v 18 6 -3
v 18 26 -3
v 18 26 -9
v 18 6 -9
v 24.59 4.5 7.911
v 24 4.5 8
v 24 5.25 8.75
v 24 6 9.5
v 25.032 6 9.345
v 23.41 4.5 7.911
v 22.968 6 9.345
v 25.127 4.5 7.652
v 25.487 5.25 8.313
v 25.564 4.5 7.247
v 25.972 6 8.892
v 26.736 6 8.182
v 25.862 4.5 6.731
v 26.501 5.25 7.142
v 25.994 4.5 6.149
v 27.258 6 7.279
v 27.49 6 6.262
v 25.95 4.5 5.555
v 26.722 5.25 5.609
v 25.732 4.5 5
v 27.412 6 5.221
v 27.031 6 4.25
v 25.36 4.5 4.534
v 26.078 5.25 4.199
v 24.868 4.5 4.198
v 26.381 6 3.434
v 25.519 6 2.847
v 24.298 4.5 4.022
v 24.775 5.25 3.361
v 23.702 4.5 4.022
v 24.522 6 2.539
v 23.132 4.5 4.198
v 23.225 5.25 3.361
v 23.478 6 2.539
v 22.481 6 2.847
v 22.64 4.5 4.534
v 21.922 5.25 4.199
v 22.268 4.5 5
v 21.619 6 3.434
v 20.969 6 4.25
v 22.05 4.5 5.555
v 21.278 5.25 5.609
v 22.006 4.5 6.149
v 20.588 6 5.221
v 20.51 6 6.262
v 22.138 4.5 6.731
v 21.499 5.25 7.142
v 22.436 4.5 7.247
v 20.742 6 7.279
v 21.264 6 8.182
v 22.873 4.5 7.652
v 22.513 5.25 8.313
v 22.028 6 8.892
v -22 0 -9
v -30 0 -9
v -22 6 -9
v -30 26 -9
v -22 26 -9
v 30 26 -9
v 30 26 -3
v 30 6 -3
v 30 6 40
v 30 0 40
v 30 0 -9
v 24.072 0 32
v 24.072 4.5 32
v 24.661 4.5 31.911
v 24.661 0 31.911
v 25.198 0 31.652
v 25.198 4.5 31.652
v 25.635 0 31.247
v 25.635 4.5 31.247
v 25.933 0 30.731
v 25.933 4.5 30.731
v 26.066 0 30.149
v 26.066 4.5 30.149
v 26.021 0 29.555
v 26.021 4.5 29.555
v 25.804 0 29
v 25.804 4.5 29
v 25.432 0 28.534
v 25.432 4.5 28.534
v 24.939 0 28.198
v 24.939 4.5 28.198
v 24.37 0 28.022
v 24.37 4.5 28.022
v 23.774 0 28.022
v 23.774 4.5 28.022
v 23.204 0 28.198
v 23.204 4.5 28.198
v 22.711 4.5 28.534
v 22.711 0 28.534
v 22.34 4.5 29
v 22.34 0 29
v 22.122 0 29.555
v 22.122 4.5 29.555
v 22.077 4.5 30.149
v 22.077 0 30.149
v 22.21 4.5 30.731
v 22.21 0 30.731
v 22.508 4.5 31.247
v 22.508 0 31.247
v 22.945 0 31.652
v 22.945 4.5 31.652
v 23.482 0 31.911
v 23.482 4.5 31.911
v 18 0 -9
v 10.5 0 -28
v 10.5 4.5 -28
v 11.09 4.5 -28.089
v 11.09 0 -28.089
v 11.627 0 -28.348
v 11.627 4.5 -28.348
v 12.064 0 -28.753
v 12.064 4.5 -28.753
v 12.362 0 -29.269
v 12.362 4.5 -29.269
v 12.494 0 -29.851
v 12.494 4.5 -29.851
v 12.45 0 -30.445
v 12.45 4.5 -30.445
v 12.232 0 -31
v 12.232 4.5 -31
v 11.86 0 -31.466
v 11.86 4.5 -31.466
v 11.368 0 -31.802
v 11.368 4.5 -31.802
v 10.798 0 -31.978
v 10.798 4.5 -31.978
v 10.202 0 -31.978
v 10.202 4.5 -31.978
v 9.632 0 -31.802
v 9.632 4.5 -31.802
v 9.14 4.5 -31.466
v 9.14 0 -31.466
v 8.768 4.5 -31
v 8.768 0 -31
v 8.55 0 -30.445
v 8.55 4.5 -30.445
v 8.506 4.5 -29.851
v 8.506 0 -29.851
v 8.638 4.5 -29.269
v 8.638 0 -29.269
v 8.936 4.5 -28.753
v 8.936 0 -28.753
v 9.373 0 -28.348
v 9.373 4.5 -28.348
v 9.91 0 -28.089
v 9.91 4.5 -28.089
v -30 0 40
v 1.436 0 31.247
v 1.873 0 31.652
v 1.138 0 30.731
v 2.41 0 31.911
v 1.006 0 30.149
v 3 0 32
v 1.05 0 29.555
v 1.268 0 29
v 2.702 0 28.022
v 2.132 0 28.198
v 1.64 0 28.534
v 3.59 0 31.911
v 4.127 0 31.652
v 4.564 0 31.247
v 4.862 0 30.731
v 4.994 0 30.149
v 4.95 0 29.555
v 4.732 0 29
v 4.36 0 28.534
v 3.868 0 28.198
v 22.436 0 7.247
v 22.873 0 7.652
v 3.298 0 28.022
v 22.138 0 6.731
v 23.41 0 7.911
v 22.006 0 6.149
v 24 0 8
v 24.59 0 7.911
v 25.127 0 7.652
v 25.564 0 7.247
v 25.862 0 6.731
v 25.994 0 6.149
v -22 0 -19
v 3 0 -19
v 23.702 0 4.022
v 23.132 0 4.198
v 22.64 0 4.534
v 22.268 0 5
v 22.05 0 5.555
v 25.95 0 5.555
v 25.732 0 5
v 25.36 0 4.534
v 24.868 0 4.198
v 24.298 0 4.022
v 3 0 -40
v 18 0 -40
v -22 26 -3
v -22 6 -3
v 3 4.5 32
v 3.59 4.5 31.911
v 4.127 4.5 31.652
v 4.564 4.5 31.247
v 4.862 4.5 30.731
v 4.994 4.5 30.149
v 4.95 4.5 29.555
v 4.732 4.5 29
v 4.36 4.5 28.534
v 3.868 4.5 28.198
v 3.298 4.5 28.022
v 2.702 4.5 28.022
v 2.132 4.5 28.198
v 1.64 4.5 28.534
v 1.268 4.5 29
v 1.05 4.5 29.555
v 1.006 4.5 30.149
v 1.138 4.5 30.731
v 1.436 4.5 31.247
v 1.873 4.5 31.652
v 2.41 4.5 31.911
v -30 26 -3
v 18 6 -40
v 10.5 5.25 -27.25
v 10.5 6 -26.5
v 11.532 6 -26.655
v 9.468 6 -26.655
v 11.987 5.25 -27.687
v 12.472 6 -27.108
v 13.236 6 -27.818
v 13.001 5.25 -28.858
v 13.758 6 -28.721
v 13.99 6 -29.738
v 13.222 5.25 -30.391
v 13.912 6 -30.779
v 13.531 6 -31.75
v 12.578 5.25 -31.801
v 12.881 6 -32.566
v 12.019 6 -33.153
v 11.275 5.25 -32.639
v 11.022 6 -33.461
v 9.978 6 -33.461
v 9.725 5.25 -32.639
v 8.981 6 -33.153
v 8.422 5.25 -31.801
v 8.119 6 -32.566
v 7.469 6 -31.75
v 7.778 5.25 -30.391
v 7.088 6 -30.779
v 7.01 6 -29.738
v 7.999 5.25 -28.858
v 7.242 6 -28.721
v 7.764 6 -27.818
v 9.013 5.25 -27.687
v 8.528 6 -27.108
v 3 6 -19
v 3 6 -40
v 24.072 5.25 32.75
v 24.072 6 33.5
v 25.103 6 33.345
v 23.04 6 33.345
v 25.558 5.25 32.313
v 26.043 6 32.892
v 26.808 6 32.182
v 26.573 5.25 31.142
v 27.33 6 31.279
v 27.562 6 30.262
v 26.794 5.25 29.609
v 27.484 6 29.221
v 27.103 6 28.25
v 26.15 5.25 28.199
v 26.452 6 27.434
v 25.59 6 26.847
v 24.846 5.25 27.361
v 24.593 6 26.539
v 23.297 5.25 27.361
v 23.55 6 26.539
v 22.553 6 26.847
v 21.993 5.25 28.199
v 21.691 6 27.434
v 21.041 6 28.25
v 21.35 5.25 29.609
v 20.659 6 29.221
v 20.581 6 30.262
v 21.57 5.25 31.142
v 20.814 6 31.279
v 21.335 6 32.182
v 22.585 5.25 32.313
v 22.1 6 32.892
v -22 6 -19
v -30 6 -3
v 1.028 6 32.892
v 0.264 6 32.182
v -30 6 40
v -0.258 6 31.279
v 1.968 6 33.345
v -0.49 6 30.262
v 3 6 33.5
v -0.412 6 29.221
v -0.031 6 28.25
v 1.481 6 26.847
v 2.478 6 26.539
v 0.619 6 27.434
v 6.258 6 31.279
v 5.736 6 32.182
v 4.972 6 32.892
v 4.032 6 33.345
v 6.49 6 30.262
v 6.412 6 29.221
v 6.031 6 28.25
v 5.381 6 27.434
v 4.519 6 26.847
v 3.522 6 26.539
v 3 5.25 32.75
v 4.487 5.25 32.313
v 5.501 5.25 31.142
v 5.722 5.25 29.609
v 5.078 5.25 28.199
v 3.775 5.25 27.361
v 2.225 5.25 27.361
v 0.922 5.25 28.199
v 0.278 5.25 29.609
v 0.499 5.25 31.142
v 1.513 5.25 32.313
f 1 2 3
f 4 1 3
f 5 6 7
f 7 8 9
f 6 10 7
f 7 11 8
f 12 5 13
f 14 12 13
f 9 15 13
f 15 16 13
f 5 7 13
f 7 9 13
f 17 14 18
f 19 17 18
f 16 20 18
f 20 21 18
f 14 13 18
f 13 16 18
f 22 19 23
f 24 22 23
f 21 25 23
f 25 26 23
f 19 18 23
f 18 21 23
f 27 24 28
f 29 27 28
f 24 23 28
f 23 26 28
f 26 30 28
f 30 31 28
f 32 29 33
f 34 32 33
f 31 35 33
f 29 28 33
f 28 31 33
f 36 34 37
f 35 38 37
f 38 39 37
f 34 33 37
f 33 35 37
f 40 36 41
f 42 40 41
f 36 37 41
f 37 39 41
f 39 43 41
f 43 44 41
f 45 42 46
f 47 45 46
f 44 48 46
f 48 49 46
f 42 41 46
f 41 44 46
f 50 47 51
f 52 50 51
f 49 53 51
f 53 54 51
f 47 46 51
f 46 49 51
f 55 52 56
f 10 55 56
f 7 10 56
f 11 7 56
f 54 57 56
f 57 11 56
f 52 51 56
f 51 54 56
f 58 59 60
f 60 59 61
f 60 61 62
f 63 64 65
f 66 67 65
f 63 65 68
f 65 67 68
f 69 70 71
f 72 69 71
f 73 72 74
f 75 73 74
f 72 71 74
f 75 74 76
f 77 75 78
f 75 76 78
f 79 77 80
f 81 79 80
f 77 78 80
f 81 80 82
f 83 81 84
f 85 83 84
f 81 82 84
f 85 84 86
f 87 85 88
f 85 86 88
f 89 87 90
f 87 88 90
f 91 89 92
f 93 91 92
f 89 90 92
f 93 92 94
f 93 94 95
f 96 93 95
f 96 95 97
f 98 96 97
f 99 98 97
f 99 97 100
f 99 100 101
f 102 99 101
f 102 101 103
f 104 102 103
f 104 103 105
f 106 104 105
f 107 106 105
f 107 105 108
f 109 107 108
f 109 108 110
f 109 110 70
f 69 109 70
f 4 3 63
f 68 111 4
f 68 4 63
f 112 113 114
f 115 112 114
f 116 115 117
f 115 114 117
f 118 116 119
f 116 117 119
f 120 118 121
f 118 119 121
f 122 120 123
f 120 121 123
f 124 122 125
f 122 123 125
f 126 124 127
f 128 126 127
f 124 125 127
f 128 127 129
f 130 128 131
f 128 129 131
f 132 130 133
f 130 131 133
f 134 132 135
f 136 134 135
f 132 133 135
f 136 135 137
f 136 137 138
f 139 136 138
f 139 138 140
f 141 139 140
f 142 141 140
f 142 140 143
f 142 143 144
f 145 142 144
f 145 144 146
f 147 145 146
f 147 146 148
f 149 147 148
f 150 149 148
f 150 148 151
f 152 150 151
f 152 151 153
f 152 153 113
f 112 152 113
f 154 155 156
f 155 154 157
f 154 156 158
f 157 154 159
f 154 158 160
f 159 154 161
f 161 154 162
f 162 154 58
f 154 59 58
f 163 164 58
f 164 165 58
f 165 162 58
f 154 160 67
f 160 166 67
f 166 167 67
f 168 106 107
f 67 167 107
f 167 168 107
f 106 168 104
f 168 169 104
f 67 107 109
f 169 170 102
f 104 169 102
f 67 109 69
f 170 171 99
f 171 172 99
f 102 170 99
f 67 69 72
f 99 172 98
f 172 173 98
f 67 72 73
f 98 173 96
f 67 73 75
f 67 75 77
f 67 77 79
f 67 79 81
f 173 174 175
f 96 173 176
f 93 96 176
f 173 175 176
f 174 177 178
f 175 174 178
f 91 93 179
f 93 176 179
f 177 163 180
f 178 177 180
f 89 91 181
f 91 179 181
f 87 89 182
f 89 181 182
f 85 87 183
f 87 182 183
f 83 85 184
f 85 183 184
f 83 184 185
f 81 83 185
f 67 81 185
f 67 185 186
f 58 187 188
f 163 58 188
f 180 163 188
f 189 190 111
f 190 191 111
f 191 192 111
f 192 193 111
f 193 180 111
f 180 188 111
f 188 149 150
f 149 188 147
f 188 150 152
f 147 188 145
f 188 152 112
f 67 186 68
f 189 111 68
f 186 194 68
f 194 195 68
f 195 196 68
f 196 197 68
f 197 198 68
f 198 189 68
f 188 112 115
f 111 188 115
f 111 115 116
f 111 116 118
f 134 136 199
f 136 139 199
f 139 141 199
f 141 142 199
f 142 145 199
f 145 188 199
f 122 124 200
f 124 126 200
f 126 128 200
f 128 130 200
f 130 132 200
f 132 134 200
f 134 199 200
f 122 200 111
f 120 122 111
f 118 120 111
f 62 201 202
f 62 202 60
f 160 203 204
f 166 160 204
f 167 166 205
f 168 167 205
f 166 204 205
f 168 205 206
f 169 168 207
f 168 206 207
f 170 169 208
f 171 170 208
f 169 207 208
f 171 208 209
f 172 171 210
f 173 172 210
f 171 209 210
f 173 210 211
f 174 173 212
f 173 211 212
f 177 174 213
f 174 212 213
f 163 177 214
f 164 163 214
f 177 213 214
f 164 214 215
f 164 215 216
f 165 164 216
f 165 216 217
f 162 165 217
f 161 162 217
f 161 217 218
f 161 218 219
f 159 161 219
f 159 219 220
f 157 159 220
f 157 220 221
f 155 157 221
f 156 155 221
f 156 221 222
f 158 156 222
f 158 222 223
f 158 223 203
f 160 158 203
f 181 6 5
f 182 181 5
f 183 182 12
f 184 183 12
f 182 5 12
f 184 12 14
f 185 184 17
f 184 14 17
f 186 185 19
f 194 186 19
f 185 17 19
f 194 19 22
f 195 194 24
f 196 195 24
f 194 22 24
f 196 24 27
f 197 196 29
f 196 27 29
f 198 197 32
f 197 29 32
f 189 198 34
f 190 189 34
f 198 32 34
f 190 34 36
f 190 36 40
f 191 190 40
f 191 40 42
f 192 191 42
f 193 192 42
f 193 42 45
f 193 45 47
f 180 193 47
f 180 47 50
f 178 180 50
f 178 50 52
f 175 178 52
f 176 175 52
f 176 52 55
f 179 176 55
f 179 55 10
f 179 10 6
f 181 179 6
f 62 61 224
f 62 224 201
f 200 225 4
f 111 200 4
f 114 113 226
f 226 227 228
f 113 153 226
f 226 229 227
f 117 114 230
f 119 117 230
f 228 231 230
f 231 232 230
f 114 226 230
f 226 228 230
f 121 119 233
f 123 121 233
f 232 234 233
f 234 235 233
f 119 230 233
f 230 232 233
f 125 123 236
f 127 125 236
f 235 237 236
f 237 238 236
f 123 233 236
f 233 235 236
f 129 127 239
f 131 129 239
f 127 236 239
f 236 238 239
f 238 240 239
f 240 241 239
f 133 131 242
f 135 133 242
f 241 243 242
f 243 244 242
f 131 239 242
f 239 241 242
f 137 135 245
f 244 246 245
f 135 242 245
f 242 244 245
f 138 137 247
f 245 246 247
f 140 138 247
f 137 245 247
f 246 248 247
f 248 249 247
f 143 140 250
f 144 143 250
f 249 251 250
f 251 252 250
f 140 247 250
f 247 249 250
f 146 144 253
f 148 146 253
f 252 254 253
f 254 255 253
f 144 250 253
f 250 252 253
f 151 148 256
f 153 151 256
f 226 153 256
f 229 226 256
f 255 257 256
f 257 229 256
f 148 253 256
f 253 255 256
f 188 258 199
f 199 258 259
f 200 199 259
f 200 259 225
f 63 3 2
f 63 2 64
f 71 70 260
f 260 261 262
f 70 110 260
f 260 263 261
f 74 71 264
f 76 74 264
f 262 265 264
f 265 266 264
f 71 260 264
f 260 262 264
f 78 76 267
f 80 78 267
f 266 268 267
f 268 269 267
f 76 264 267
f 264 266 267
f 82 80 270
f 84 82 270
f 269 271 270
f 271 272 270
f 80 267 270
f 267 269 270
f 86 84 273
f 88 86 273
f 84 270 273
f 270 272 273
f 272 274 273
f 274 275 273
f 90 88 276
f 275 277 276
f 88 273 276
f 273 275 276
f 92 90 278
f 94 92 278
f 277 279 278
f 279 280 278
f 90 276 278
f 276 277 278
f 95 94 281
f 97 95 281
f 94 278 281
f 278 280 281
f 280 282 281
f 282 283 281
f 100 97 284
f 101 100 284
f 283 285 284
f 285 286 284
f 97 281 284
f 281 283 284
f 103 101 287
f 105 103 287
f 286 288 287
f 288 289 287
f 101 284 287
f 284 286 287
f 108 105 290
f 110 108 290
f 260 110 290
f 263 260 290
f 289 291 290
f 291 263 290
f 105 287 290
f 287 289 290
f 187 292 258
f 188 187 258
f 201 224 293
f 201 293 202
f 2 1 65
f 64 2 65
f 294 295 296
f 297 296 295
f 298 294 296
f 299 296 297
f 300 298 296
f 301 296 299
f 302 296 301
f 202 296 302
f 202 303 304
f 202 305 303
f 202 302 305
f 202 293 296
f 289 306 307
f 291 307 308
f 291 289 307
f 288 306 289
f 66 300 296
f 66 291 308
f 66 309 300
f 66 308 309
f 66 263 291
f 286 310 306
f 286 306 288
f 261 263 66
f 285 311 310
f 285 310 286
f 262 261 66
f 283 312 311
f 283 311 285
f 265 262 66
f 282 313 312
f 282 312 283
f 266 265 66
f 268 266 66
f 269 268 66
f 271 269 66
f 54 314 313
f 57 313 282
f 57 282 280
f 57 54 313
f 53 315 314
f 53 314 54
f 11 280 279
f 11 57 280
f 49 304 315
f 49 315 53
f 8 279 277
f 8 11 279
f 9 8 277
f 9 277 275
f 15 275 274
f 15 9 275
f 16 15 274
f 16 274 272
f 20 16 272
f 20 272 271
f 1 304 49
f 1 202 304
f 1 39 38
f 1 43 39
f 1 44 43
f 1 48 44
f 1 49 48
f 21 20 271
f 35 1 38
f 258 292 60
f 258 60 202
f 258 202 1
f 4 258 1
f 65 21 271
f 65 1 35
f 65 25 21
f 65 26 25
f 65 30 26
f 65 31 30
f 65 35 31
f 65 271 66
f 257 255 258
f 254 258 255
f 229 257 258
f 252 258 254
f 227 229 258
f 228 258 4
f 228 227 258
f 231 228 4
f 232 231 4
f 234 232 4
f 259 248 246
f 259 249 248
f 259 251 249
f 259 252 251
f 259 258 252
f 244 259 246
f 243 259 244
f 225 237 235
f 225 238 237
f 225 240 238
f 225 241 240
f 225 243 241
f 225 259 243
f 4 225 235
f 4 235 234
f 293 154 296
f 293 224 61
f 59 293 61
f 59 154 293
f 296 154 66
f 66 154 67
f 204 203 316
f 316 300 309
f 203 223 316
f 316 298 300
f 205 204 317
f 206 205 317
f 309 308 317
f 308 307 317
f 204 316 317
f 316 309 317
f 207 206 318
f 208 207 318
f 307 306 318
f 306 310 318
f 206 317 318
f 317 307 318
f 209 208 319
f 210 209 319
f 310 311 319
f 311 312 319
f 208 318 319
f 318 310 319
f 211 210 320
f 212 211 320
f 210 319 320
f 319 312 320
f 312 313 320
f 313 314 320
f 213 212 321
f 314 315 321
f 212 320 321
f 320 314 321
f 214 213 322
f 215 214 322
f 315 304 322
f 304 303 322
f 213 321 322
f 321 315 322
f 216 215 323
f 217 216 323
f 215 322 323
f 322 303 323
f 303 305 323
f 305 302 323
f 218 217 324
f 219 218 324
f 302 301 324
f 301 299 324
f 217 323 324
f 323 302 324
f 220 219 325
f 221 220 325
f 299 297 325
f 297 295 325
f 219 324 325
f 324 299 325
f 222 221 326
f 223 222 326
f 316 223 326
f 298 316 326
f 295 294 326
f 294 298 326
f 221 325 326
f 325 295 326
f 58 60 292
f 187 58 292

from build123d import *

# Parameters (mm, degrees)
SKETCH1_W           = 60
SKETCH1_H           = 80
BOSS_EXTRUDE1_DEPTH = 6
SKETCH2_R           = 2
CUT_EXTRUDE1_DEPTH  = 51.358713248
SKETCH3_W           = 12
SKETCH3_H           = 6
SKETCH3_W_2         = 8
BOSS_EXTRUDE2_DEPTH = 20
CHAMFER1_SIZE       = 1.5


with BuildPart() as part:
    # Sketch1 → Boss-Extrude1 (new body)
    with BuildSketch(Plane(origin=(0, 0, 0), x_dir=(1, 0, 0), z_dir=(0, 1, 0))):
        Rectangle(SKETCH1_W, SKETCH1_H)
    extrude(amount=BOSS_EXTRUDE1_DEPTH)

    # Sketch2 → Cut-Extrude1 (cut, through all)
    with BuildSketch(Plane(origin=(0, 6, 0), x_dir=(1, 0, 0), z_dir=(0, 1, 0))):
        with Locations(Location((3, -30, 0), (0, 0, 270))):
            Circle(SKETCH2_R)
        with Locations(Location((24.071589502, -30, 0), (0, 0, 270))):
            Circle(SKETCH2_R)
        with Locations(Location((24, -6, 0), (0, 0, 270))):
            Circle(SKETCH2_R)
        with Locations(Location((10.5, 30, 0), (0, 0, 270))):
            Circle(SKETCH2_R)
        Polygon((-40.891606185, 9), (-22, 9), (-22, 19), (3, 19), (3, 40), (18, 40), (18, 9), (35.945141675, 9), (35.945141675, 57.336722716), (-40.891606185, 57.336722716), align=None)
    extrude(amount=-CUT_EXTRUDE1_DEPTH, mode=Mode.SUBTRACT)

    # Sketch3 → Boss-Extrude2 (add)
    with BuildSketch(Plane(origin=(0, 6, 0), x_dir=(1, 0, 0), z_dir=(0, 1, 0))):
        with Locations((24, 6)):
            Rectangle(SKETCH3_W, SKETCH3_H)
        with Locations((-26, 6)):
            Rectangle(SKETCH3_W_2, SKETCH3_H)
    extrude(amount=BOSS_EXTRUDE2_DEPTH)

    # Chamfer1
    chamfer1_edges = [part.edges().sort_by_distance(p)[0] for p in [
        (3, 6, 28),
        (24.071589502, 6, 28),
        (24, 6, 4),
        (10.5, 6, -32),
    ]]
    chamfer(chamfer1_edges, length=CHAMFER1_SIZE)


solid = part.part
